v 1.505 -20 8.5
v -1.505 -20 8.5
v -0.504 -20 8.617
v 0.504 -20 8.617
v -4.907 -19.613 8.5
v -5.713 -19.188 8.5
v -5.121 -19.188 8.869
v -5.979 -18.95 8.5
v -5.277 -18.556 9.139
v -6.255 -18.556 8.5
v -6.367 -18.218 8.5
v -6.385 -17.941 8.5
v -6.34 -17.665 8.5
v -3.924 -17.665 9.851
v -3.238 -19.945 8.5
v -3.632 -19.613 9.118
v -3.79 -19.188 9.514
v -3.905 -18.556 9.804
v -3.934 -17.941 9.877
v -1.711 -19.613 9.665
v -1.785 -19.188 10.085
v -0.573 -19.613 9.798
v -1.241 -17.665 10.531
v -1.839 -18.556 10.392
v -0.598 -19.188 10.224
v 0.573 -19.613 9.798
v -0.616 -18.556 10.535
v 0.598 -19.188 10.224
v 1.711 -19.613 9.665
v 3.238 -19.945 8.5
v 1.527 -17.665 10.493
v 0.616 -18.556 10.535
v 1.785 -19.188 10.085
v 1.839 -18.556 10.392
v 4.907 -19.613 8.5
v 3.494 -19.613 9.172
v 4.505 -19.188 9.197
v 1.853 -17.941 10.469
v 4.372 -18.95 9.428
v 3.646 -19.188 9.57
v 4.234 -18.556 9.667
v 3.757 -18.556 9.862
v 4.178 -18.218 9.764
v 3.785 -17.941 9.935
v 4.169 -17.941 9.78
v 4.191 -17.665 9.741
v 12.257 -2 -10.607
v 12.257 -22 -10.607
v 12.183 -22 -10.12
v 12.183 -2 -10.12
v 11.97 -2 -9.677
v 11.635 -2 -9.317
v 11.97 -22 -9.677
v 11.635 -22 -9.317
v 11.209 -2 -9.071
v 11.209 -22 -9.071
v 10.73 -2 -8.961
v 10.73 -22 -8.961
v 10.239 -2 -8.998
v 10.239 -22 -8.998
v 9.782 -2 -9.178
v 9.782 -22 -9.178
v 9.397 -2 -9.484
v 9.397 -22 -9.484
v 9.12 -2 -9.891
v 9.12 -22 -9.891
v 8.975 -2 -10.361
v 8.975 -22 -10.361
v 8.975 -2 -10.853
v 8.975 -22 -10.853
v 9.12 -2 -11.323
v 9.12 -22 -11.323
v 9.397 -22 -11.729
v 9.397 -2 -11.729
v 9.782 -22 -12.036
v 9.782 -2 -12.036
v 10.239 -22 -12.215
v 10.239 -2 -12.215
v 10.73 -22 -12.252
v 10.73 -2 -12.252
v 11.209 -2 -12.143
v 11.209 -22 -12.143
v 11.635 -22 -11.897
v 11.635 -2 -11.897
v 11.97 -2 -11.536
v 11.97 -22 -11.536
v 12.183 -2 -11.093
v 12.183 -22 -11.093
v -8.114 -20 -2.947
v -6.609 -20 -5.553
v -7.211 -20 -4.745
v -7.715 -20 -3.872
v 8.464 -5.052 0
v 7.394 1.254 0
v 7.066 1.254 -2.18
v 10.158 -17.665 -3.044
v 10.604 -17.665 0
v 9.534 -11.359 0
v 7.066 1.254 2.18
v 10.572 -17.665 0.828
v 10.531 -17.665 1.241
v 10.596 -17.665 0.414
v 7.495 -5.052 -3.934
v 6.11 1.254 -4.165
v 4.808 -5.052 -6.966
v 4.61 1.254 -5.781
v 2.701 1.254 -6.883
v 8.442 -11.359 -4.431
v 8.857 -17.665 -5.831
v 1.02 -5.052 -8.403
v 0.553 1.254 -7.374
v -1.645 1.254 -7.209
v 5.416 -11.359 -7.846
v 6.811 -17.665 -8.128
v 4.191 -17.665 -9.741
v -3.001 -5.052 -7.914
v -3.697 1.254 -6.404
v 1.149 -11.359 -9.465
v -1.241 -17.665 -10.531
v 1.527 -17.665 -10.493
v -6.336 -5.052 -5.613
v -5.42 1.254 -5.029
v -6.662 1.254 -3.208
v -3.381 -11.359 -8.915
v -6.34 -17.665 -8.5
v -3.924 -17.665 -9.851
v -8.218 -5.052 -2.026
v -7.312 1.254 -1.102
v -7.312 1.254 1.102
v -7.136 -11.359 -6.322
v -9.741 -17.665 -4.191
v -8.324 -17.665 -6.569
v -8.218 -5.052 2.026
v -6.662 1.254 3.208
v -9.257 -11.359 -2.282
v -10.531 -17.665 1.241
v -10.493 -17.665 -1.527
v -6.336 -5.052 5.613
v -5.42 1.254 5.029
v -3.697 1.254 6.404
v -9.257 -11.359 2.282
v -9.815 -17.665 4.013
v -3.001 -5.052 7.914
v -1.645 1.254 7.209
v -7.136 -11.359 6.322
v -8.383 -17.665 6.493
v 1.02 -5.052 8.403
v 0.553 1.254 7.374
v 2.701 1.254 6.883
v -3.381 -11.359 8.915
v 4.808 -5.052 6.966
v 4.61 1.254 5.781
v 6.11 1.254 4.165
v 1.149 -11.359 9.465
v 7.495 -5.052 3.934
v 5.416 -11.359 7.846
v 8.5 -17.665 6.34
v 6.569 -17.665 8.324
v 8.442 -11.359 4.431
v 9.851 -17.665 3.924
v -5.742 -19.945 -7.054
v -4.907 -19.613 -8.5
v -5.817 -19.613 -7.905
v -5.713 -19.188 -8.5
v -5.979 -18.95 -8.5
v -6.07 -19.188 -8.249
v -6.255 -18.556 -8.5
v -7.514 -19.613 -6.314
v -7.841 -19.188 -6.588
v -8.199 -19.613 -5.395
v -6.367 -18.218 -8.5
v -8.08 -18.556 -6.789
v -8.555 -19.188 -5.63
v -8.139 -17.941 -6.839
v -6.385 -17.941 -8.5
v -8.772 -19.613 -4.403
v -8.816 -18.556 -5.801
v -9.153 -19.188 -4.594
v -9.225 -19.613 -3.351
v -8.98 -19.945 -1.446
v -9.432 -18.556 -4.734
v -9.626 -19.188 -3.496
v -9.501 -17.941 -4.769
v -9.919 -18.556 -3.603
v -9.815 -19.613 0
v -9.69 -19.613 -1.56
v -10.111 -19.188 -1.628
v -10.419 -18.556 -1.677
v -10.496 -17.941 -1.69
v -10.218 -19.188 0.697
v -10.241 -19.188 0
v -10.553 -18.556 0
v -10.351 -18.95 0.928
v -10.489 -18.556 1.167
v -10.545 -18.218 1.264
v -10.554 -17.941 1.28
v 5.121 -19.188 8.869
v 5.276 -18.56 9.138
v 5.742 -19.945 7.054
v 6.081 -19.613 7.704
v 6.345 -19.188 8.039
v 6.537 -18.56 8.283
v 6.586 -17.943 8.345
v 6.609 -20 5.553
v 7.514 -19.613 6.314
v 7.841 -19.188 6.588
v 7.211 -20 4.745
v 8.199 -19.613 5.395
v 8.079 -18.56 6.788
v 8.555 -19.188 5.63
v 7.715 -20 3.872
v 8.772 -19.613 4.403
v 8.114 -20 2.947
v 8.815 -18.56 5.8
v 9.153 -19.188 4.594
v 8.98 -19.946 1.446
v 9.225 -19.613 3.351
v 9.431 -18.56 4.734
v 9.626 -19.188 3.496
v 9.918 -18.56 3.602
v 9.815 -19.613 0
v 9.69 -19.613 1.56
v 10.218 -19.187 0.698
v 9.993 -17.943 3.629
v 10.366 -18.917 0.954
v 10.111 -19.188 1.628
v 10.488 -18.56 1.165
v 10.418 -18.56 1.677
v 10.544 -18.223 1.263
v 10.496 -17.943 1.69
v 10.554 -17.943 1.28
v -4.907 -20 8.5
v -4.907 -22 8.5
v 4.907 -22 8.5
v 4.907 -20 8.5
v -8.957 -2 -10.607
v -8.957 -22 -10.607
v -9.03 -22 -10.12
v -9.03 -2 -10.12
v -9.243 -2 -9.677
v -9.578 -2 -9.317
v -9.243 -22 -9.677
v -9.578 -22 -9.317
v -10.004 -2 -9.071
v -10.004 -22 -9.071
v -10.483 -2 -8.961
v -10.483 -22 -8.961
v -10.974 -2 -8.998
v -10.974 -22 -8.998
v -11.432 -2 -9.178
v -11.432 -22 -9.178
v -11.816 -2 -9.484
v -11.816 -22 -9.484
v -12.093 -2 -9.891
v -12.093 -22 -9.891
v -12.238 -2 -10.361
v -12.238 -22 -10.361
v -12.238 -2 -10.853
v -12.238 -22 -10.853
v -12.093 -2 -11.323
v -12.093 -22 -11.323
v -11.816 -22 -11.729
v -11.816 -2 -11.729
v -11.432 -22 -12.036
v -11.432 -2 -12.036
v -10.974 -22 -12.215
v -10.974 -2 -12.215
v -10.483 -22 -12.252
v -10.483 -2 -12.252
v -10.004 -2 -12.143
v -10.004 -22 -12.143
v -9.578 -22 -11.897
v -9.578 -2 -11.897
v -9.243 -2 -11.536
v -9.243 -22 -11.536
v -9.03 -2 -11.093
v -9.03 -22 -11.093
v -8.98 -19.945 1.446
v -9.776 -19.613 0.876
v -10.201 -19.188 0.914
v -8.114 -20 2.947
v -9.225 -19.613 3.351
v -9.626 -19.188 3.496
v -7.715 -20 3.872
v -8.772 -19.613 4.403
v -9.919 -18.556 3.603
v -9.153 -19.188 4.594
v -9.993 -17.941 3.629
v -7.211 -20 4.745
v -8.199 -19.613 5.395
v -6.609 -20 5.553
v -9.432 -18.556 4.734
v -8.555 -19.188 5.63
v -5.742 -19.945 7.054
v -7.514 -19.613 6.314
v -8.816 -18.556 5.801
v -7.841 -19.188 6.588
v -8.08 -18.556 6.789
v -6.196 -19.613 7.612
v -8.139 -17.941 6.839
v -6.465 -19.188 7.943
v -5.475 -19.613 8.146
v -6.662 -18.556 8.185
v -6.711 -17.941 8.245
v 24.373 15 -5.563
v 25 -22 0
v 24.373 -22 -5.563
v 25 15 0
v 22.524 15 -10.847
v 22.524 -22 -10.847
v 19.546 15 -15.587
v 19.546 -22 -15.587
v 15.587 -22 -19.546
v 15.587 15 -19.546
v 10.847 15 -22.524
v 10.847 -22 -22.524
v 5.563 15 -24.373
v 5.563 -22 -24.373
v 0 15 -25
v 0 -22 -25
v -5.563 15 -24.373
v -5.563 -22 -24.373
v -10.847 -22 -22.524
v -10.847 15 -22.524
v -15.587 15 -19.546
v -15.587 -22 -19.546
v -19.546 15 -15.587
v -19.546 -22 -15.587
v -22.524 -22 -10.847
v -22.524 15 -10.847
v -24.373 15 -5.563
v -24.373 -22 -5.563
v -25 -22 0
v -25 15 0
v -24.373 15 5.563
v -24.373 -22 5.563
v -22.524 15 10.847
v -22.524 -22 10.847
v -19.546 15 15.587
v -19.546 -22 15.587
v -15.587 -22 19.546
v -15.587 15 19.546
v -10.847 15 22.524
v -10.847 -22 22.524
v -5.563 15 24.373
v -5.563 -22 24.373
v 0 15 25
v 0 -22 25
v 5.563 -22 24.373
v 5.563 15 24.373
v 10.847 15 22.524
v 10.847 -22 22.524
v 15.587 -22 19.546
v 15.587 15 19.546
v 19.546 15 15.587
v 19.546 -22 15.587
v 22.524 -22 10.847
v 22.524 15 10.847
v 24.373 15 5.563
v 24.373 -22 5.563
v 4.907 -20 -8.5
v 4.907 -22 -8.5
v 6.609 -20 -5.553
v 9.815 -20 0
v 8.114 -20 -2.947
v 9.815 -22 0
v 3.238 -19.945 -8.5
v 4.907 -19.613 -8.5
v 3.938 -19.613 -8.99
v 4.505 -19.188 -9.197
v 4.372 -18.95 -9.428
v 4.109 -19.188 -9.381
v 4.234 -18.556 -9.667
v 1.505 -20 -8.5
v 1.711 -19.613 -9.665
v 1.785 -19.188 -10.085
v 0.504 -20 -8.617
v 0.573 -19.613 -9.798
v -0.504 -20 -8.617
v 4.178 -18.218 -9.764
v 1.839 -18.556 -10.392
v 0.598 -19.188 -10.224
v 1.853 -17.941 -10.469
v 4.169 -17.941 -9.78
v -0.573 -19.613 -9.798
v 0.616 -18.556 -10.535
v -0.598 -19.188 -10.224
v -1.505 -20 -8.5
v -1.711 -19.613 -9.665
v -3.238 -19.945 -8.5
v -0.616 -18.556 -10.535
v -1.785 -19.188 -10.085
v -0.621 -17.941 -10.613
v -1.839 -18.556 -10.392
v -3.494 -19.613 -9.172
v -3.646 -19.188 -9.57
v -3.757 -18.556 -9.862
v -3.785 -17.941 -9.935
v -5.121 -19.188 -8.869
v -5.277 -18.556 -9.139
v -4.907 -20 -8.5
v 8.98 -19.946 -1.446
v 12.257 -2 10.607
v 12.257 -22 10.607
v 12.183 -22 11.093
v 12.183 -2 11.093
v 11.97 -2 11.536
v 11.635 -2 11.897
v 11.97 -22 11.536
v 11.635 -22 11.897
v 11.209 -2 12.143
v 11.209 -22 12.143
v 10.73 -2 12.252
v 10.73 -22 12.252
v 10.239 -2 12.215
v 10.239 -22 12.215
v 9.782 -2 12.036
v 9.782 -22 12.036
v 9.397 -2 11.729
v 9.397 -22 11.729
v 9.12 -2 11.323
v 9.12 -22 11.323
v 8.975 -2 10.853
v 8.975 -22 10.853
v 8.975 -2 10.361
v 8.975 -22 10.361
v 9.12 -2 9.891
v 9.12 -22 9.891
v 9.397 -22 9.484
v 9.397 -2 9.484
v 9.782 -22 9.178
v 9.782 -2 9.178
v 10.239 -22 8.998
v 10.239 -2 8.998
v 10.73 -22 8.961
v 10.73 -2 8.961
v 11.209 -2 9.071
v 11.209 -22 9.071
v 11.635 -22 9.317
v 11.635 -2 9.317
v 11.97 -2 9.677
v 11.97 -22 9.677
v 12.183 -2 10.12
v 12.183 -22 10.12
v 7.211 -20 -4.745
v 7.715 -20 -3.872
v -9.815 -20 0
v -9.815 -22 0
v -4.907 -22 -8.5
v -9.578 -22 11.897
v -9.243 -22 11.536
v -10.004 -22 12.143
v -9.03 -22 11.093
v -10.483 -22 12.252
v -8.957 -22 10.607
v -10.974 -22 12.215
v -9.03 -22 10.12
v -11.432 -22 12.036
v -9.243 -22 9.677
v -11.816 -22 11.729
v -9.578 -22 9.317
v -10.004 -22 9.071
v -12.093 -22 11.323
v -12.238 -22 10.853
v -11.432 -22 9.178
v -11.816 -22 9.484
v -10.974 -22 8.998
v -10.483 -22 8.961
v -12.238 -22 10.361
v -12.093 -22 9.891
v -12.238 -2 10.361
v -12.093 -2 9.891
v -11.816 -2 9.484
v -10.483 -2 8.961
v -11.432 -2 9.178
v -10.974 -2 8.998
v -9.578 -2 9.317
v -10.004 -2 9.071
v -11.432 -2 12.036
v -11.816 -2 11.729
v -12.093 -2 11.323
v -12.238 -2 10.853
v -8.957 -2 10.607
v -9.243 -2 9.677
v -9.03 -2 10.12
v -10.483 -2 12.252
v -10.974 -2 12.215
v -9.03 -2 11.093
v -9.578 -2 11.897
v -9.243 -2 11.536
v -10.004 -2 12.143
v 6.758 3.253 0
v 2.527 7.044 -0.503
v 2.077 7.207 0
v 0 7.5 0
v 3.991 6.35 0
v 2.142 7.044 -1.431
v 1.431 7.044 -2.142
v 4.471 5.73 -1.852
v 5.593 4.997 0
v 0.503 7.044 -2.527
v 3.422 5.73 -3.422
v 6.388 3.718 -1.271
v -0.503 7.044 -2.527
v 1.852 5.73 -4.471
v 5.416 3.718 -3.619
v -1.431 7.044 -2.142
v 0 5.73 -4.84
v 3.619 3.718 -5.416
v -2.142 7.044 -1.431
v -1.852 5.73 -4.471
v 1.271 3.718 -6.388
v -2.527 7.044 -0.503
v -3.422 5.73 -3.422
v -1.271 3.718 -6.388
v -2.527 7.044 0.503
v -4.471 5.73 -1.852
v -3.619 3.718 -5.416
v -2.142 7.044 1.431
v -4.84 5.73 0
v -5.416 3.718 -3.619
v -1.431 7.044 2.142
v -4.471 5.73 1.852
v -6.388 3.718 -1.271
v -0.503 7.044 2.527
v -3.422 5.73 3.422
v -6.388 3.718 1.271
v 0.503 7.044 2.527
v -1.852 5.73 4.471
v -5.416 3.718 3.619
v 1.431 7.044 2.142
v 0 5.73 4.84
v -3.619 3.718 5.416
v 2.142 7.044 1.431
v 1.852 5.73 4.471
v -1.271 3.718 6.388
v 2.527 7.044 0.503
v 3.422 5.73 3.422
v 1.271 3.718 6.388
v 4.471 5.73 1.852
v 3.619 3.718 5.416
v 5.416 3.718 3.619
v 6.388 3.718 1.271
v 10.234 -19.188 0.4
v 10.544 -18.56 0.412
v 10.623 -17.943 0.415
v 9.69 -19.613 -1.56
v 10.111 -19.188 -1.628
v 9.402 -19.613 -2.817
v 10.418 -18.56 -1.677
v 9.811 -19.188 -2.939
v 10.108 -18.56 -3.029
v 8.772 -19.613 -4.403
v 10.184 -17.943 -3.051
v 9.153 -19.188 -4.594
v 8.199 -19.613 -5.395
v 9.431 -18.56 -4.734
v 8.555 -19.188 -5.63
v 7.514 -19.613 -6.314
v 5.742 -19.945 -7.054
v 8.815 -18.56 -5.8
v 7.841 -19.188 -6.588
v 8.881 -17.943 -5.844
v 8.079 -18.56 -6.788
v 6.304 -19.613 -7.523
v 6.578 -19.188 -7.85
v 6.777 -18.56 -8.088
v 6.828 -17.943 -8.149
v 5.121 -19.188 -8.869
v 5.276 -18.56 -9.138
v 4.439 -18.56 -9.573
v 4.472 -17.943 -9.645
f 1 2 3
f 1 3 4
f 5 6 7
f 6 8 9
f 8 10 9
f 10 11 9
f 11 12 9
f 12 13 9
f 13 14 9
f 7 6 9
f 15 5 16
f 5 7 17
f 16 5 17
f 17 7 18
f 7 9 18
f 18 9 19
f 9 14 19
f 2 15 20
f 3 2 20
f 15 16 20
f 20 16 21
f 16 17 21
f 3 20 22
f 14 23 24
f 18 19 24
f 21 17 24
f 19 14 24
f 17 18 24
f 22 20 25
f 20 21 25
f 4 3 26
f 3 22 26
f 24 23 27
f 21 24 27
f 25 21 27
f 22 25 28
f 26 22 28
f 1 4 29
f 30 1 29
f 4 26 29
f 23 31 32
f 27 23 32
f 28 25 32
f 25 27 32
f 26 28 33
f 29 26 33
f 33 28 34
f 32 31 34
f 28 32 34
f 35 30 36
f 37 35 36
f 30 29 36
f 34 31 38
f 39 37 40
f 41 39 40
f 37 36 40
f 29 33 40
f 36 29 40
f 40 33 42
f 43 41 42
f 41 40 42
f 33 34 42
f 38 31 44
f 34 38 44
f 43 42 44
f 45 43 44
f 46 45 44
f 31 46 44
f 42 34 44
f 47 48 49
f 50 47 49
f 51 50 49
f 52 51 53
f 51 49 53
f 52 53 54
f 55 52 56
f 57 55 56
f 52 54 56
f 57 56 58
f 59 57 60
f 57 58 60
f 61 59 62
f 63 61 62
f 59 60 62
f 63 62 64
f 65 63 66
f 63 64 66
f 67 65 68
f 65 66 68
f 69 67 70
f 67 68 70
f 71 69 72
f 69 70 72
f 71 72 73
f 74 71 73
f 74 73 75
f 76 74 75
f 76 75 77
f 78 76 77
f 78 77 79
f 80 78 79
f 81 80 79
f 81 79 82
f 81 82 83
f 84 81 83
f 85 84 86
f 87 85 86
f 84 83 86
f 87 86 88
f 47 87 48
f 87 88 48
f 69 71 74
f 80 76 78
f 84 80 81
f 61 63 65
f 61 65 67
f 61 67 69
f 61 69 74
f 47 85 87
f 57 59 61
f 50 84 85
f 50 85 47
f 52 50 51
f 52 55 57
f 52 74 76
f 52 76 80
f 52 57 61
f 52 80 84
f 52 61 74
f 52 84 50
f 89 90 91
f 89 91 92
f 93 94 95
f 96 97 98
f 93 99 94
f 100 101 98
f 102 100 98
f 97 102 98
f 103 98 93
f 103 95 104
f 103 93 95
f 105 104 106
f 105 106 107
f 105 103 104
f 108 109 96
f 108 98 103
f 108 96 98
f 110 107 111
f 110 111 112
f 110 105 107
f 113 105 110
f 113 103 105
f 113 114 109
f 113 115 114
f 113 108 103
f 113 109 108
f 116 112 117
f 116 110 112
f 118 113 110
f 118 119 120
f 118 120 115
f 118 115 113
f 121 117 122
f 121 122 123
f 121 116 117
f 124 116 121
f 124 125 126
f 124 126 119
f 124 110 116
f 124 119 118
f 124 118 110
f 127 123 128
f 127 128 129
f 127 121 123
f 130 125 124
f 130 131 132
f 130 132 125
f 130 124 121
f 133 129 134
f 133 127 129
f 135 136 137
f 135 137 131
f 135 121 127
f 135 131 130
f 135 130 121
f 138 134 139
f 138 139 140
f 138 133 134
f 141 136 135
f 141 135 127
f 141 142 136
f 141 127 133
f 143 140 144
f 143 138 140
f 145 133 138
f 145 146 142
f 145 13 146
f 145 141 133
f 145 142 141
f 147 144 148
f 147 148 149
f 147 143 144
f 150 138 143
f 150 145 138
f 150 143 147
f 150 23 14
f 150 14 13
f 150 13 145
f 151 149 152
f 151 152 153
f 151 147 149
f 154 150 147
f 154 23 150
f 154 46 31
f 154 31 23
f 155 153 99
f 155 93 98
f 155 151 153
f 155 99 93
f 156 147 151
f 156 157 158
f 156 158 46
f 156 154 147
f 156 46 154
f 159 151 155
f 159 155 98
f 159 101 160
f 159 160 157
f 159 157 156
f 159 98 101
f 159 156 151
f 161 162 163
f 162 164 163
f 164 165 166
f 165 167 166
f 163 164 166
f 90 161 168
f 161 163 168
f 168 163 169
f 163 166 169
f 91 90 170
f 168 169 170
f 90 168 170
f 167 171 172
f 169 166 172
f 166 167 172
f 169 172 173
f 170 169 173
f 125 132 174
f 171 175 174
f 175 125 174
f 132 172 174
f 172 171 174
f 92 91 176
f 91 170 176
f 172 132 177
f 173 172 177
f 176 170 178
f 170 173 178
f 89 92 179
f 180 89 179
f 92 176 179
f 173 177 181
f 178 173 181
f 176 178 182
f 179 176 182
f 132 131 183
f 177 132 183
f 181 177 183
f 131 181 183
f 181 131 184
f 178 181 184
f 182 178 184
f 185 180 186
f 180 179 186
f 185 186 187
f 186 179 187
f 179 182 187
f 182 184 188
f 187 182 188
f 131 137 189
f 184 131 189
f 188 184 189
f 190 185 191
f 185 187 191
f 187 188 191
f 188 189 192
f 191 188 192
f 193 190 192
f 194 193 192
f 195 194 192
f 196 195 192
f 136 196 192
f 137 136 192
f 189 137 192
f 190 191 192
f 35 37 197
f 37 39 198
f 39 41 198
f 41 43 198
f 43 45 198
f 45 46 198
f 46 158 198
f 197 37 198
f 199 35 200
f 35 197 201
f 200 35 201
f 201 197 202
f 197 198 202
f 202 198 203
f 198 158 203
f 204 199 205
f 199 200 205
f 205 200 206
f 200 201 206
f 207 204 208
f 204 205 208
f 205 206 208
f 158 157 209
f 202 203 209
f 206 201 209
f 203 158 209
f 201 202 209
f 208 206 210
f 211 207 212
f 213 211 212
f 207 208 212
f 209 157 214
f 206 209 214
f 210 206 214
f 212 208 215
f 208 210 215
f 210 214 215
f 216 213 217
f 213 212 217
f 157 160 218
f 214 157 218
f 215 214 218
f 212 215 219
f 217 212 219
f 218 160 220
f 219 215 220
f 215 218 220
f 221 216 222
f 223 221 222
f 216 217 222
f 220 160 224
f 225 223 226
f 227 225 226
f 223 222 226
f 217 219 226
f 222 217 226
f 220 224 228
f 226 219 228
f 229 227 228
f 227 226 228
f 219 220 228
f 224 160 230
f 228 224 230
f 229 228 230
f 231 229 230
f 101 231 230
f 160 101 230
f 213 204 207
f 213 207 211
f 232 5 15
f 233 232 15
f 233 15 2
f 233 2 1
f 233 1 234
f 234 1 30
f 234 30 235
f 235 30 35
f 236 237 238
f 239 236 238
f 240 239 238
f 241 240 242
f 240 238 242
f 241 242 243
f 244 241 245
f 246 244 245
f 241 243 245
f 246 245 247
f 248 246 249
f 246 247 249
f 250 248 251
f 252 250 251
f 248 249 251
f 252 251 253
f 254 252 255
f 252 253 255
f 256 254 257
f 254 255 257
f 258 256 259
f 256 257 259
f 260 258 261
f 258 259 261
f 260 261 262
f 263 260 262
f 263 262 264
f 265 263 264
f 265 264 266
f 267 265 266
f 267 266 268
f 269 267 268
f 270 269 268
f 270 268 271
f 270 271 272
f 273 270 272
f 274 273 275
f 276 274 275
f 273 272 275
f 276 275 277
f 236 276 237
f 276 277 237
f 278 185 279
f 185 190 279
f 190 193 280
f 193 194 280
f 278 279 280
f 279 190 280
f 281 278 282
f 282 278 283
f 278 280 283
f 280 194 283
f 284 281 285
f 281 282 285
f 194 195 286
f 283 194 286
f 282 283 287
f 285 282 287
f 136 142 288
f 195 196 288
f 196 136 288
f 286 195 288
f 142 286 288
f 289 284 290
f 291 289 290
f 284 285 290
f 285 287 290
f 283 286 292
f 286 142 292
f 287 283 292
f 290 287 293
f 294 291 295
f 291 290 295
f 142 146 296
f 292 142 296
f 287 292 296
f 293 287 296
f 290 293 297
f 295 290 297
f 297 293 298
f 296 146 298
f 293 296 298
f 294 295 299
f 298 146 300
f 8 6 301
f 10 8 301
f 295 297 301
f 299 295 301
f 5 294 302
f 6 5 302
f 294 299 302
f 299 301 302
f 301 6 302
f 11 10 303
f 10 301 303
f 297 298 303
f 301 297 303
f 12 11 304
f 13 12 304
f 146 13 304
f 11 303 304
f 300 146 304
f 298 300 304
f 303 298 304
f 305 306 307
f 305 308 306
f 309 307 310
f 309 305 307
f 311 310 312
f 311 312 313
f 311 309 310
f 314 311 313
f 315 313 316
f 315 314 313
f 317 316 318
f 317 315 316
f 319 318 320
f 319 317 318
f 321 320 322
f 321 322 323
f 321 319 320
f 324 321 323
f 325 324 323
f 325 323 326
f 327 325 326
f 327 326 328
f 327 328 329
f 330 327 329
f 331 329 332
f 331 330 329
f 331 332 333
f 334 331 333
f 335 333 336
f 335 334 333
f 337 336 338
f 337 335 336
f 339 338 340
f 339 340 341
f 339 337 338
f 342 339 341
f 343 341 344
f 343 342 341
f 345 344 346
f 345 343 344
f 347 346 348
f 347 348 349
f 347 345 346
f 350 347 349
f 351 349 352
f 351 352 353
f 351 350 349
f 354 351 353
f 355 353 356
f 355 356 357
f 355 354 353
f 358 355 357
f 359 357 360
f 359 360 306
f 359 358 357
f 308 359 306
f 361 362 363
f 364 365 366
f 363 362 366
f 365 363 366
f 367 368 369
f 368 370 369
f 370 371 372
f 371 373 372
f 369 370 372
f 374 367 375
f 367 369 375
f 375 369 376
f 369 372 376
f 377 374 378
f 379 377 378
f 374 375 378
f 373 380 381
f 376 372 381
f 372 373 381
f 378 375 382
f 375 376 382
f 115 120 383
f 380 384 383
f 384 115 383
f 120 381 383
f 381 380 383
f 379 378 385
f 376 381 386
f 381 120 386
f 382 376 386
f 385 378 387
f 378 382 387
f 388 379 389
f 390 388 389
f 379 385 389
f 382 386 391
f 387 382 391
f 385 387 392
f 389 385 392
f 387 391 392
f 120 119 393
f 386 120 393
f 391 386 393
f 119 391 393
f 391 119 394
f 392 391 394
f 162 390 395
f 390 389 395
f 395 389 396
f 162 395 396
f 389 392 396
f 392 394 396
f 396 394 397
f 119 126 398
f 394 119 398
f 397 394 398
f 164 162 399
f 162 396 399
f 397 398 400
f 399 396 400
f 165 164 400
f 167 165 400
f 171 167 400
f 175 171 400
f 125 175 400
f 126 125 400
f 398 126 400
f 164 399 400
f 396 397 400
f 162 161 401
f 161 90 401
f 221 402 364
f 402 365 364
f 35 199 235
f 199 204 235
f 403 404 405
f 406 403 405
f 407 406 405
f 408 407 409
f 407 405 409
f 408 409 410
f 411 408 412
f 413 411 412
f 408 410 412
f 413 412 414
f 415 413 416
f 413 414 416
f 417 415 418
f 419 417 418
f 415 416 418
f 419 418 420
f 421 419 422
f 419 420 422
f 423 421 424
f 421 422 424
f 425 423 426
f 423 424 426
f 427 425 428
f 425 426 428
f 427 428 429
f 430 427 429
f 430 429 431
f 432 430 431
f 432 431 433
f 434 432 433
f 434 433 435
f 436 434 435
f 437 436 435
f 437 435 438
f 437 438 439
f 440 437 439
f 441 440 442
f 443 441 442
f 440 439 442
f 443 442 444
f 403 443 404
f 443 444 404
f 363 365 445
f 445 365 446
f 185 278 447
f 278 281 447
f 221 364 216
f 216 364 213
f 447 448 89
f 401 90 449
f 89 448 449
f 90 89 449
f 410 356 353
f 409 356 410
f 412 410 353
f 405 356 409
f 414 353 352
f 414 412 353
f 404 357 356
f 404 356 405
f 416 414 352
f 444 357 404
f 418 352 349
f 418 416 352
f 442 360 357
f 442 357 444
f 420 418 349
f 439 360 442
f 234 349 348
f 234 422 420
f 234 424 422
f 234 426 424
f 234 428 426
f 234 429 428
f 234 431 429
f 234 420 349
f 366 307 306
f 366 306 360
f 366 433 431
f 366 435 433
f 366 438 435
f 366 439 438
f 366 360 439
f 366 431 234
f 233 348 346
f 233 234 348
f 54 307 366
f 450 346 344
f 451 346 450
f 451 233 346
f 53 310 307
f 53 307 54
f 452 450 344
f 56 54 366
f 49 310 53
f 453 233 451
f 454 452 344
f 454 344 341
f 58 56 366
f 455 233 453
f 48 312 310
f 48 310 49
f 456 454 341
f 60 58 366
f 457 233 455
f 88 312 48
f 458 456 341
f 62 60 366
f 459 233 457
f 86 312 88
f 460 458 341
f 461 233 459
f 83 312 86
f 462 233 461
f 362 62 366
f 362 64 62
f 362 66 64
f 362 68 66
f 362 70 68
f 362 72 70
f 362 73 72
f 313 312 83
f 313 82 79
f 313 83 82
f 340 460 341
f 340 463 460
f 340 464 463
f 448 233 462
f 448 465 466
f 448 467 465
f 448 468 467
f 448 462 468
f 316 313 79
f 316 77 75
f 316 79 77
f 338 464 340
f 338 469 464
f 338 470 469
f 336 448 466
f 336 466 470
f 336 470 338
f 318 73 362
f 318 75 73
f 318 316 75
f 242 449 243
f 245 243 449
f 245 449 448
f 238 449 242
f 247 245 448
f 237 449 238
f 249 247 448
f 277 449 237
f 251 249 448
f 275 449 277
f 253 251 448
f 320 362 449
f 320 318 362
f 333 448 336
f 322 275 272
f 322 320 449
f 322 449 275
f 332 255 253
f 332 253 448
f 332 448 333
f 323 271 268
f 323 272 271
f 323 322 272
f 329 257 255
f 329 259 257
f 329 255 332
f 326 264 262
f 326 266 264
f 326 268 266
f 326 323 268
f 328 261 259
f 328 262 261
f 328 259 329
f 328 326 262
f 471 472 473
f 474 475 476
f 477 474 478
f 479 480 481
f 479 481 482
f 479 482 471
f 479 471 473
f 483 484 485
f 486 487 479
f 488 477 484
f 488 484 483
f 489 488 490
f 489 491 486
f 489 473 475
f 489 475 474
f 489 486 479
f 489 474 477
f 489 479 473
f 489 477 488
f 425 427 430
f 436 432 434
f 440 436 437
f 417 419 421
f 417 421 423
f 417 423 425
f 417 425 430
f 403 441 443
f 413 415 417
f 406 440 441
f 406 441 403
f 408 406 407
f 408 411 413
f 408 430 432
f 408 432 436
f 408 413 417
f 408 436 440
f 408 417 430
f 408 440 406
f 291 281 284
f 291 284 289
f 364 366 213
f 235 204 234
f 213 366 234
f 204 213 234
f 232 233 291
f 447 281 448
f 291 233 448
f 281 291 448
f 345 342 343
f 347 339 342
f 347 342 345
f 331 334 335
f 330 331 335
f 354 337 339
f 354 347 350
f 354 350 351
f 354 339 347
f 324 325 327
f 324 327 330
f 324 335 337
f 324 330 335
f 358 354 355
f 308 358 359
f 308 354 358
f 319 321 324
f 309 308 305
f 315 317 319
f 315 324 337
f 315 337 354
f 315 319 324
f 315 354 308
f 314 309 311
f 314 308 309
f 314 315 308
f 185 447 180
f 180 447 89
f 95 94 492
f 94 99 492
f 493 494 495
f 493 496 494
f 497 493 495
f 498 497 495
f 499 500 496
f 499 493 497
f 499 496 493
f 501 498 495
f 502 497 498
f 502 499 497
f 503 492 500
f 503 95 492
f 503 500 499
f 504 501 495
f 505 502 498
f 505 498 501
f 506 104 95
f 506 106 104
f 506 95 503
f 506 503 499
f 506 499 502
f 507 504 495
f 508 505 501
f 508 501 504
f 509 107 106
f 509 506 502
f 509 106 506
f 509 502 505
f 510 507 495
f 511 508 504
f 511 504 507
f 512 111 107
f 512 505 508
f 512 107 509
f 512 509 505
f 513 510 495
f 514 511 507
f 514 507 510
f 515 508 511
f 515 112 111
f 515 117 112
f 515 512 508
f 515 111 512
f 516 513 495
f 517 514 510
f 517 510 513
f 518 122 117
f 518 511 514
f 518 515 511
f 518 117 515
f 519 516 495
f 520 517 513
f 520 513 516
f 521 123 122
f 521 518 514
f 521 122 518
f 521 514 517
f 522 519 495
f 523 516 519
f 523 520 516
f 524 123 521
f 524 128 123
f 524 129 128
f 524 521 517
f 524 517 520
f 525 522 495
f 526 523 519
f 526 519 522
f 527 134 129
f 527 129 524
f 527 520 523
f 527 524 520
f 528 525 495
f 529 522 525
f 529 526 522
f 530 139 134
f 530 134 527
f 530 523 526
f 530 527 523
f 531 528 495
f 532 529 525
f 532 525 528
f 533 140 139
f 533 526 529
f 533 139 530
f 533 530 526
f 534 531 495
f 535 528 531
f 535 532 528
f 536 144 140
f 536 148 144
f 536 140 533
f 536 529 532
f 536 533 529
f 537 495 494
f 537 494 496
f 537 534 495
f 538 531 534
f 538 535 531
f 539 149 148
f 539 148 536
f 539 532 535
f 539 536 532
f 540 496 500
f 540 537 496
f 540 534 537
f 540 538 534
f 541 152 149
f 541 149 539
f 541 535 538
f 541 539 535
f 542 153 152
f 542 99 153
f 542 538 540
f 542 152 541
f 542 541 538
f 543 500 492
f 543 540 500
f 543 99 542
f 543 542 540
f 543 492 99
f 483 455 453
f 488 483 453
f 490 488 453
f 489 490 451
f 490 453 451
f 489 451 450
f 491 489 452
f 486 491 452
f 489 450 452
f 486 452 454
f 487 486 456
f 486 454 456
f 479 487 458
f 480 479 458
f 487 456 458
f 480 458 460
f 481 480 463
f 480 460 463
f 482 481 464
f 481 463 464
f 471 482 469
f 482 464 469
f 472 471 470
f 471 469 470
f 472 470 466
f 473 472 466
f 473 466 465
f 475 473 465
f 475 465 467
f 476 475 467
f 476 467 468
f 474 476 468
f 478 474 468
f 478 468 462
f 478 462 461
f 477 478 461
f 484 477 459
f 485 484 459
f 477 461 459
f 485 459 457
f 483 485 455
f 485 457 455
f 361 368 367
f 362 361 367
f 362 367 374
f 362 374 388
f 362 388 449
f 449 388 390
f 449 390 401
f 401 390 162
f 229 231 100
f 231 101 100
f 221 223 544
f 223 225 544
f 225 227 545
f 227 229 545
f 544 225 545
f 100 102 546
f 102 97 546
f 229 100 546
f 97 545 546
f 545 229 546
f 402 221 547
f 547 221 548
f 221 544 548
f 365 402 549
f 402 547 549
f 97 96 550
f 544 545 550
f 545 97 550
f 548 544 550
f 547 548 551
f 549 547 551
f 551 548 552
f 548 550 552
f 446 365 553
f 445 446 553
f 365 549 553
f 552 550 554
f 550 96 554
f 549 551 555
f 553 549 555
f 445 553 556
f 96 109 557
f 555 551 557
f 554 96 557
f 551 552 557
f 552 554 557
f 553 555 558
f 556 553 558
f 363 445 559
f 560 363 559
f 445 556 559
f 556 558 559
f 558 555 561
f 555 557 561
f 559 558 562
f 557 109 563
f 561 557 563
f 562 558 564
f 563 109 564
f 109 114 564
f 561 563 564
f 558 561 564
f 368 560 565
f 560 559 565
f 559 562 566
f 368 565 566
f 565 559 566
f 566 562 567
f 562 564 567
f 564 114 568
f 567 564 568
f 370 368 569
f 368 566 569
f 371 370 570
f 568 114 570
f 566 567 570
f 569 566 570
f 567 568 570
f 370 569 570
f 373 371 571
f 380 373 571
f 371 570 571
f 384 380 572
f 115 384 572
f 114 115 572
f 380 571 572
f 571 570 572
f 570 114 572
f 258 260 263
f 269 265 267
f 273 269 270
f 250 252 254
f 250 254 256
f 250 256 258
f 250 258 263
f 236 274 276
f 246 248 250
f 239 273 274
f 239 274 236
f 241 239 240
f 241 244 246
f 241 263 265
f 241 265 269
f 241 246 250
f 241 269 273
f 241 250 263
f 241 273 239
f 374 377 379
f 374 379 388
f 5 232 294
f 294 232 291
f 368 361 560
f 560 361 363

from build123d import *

# Parameters (mm, degrees)
ENL_V_MAT_EXTRU_1_DEPTH = 4
CONG_1_R                = 2
ESQUISSE3_R             = 1.65
ENL_V_MAT_EXTRU_2_DEPTH = 20


with BuildPart() as part:
    # Esquisse1 → Révolution2 (revolve)
    with BuildSketch(Plane.XY, mode=Mode.PRIVATE) as r_volution2_sk:
        with BuildLine():
            Line((-7.394355414, 1.254395478), (-11, -20))
            Line((-11, -20), (-8, -20))
            Line((-8, -20), (-8, -22))
            Line((-8, -22), (-25, -22))
            Line((-25, -22), (-25, -20))
            Line((-25, -20), (-25, 15))
            Line((-25, 15), (0, 15))
            Line((0, 15), (0, 7.5))
            ThreePointArc((0, 7.5), (-4.839526522, 5.729658196), (-7.394355414, 1.254395478))
        make_face()
    revolve(r_volution2_sk.sketch.rotate(Axis((0, 7.5, 0), (0, 1, 0)), 180), axis=Axis((0, 7.5, 0), (0, 1, 0)))

    # Esquisse2 → Enlèv. mat.-Extru.1 (cut)
    with BuildSketch(Plane.XZ.offset(22)):
        Polygon((9.814954576, 0), (4.907477288, 8.5), (-4.907477288, 8.5), (-9.814954576, 0), (-4.907477288, -8.5), (4.907477288, -8.5), align=None)
    extrude(amount=-ENL_V_MAT_EXTRU_1_DEPTH, mode=Mode.SUBTRACT)

    # Congé1
    # the kernel refuses this fillet: 2 mm, written as the material it adds along each edge
    with BuildSketch(Plane(origin=(0, -20, 0), x_dir=(1, 0, 0), z_dir=(0, 0, 1))) as cong_1_piece_1_section:
        with BuildLine():
            CenterArc((11 - CONG_1_R * 1.1839294959, CONG_1_R), CONG_1_R, 270, 99.628125236)
            Line((11 - CONG_1_R * 1.1839294959, 0), (11, 0))
            Line((11, 0), (11 - CONG_1_R * 0.198015440727, CONG_1_R * 1.16725273035))
        make_face()
    cong_1_piece_1 = revolve(axis=Axis((0, -20, 0), (0, 1, 0)), mode=Mode.PRIVATE)
    cong_1_piece_1 = split(cong_1_piece_1, bisect_by=Plane(origin=(10.002736097, -19.349469748, 0.325247134), z_dir=(0.8660254037844389, 0, -0.49999999999999956)), keep=Keep.TOP, mode=Mode.PRIVATE)
    with BuildSketch(Plane(origin=(0, -20, 0), x_dir=(1, 0, 0), z_dir=(0, 0, 1))) as cong_1_piece_2_section:
        with BuildLine():
            CenterArc((11 - CONG_1_R * 1.1839294959, CONG_1_R), CONG_1_R, 270, 99.628125236)
            Line((11 - CONG_1_R * 1.1839294959, 0), (11, 0))
            Line((11, 0), (11 - CONG_1_R * 0.198015440727, CONG_1_R * 1.16725273035))
        make_face()
    cong_1_piece_2 = revolve(axis=Axis((0, -20, 0), (0, 1, 0)), mode=Mode.PRIVATE)
    cong_1_piece_2 = split(cong_1_piece_2, bisect_by=Plane(origin=(7.361215688, -19.472047685, 4.250000423), z_dir=(0.8660254037844387, 0, 0.5000000000000003)), keep=Keep.TOP, mode=Mode.PRIVATE)
    with BuildSketch(Plane(origin=(0, -20, 0), x_dir=(1, 0, 0), z_dir=(0, 0, 1))) as cong_1_piece_3_section:
        with BuildLine():
            CenterArc((11 - CONG_1_R * 1.1839294959, CONG_1_R), CONG_1_R, 270, 99.628125236)
            Line((11 - CONG_1_R * 1.1839294959, 0), (11, 0))
            Line((11, 0), (11 - CONG_1_R * 0.198015440727, CONG_1_R * 1.16725273035))
        make_face()
    cong_1_piece_3 = revolve(axis=Axis((0, -20, 0), (0, 1, 0)), mode=Mode.PRIVATE)
    cong_1_piece_3 = split(cong_1_piece_3, bisect_by=Plane(origin=(-2.9e-08, -19.472047136, -8.5), z_dir=(0, 0, -1)), keep=Keep.TOP, mode=Mode.PRIVATE)
    with BuildSketch(Plane(origin=(0, -20, 0), x_dir=(1, 0, 0), z_dir=(0, 0, 1))) as cong_1_piece_4_section:
        with BuildLine():
            CenterArc((11 - CONG_1_R * 1.1839294959, CONG_1_R), CONG_1_R, 270, 99.628125236)
            Line((11 - CONG_1_R * 1.1839294959, 0), (11, 0))
            Line((11, 0), (11 - CONG_1_R * 0.198015440727, CONG_1_R * 1.16725273035))
        make_face()
    cong_1_piece_4 = revolve(axis=Axis((0, -20, 0), (0, 1, 0)), mode=Mode.PRIVATE)
    cong_1_piece_4 = split(cong_1_piece_4, bisect_by=Plane(origin=(2.9e-08, -19.472047136, 8.5), z_dir=(0, 0, 1)), keep=Keep.TOP, mode=Mode.PRIVATE)
    with BuildSketch(Plane(origin=(0, -20, 0), x_dir=(1, 0, 0), z_dir=(0, 0, 1))) as cong_1_piece_5_section:
        with BuildLine():
            CenterArc((11 - CONG_1_R * 1.1839294959, CONG_1_R), CONG_1_R, 270, 99.628125236)
            Line((11 - CONG_1_R * 1.1839294959, 0), (11, 0))
            Line((11, 0), (11 - CONG_1_R * 0.198015440727, CONG_1_R * 1.16725273035))
        make_face()
    cong_1_piece_5 = revolve(axis=Axis((0, -20, 0), (0, 1, 0)), mode=Mode.PRIVATE)
    cong_1_piece_5 = split(cong_1_piece_5, bisect_by=Plane(origin=(-7.361215946, -19.472047136, -4.249999975), z_dir=(-0.8660254037844387, 0, -0.5000000000000001)), keep=Keep.TOP, mode=Mode.PRIVATE)
    with BuildSketch(Plane(origin=(0, -20, 0), x_dir=(1, 0, 0), z_dir=(0, 0, 1))) as cong_1_piece_6_section:
        with BuildLine():
            CenterArc((11 - CONG_1_R * 1.1839294959, CONG_1_R), CONG_1_R, 270, 99.628125236)
            Line((11 - CONG_1_R * 1.1839294959, 0), (11, 0))
            Line((11, 0), (11 - CONG_1_R * 0.198015440727, CONG_1_R * 1.16725273035))
        make_face()
    cong_1_piece_6 = revolve(axis=Axis((0, -20, 0), (0, 1, 0)), mode=Mode.PRIVATE)
    cong_1_piece_6 = split(cong_1_piece_6, bisect_by=Plane(origin=(-7.361215918, -19.472047136, 4.250000025), z_dir=(-0.8660254037844387, 0, 0.4999999999999999)), keep=Keep.TOP, mode=Mode.PRIVATE)
    add([cong_1_piece_1, cong_1_piece_2, cong_1_piece_3, cong_1_piece_4, cong_1_piece_5, cong_1_piece_6])

    # Esquisse3 → Enlèv. mat.-Extru.2 (cut)
    with BuildSketch(Plane.XZ.offset(22)):
        with Locations((10.606601718, -10.606601718)):
            Circle(ESQUISSE3_R)
        with Locations((-10.606601718, -10.606601718)):
            Circle(ESQUISSE3_R)
        with Locations((-10.606601718, 10.606601718)):
            Circle(ESQUISSE3_R)
        with Locations((10.606601718, 10.606601718)):
            Circle(ESQUISSE3_R)
    extrude(amount=-ENL_V_MAT_EXTRU_2_DEPTH, mode=Mode.SUBTRACT)


solid = part.part
